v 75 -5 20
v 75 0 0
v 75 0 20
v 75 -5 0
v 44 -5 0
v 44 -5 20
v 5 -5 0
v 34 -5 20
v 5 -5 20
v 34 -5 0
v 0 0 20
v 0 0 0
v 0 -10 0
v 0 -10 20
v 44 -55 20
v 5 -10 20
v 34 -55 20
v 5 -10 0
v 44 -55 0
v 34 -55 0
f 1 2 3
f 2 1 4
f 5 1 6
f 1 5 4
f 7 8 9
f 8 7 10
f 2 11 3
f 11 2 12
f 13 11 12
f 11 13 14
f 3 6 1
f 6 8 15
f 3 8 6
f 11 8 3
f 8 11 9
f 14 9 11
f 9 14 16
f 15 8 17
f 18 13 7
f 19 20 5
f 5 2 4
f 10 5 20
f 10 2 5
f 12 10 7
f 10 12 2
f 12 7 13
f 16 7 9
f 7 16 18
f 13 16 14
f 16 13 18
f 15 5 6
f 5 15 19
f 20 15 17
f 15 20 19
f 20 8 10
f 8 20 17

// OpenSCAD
$fn=20;

rotate([90,0,0])
union(){
cube([75,20,5]);
cube([5,20,10]);
translate([29+5,0,0]) cube([10,20,50+5]);
}
